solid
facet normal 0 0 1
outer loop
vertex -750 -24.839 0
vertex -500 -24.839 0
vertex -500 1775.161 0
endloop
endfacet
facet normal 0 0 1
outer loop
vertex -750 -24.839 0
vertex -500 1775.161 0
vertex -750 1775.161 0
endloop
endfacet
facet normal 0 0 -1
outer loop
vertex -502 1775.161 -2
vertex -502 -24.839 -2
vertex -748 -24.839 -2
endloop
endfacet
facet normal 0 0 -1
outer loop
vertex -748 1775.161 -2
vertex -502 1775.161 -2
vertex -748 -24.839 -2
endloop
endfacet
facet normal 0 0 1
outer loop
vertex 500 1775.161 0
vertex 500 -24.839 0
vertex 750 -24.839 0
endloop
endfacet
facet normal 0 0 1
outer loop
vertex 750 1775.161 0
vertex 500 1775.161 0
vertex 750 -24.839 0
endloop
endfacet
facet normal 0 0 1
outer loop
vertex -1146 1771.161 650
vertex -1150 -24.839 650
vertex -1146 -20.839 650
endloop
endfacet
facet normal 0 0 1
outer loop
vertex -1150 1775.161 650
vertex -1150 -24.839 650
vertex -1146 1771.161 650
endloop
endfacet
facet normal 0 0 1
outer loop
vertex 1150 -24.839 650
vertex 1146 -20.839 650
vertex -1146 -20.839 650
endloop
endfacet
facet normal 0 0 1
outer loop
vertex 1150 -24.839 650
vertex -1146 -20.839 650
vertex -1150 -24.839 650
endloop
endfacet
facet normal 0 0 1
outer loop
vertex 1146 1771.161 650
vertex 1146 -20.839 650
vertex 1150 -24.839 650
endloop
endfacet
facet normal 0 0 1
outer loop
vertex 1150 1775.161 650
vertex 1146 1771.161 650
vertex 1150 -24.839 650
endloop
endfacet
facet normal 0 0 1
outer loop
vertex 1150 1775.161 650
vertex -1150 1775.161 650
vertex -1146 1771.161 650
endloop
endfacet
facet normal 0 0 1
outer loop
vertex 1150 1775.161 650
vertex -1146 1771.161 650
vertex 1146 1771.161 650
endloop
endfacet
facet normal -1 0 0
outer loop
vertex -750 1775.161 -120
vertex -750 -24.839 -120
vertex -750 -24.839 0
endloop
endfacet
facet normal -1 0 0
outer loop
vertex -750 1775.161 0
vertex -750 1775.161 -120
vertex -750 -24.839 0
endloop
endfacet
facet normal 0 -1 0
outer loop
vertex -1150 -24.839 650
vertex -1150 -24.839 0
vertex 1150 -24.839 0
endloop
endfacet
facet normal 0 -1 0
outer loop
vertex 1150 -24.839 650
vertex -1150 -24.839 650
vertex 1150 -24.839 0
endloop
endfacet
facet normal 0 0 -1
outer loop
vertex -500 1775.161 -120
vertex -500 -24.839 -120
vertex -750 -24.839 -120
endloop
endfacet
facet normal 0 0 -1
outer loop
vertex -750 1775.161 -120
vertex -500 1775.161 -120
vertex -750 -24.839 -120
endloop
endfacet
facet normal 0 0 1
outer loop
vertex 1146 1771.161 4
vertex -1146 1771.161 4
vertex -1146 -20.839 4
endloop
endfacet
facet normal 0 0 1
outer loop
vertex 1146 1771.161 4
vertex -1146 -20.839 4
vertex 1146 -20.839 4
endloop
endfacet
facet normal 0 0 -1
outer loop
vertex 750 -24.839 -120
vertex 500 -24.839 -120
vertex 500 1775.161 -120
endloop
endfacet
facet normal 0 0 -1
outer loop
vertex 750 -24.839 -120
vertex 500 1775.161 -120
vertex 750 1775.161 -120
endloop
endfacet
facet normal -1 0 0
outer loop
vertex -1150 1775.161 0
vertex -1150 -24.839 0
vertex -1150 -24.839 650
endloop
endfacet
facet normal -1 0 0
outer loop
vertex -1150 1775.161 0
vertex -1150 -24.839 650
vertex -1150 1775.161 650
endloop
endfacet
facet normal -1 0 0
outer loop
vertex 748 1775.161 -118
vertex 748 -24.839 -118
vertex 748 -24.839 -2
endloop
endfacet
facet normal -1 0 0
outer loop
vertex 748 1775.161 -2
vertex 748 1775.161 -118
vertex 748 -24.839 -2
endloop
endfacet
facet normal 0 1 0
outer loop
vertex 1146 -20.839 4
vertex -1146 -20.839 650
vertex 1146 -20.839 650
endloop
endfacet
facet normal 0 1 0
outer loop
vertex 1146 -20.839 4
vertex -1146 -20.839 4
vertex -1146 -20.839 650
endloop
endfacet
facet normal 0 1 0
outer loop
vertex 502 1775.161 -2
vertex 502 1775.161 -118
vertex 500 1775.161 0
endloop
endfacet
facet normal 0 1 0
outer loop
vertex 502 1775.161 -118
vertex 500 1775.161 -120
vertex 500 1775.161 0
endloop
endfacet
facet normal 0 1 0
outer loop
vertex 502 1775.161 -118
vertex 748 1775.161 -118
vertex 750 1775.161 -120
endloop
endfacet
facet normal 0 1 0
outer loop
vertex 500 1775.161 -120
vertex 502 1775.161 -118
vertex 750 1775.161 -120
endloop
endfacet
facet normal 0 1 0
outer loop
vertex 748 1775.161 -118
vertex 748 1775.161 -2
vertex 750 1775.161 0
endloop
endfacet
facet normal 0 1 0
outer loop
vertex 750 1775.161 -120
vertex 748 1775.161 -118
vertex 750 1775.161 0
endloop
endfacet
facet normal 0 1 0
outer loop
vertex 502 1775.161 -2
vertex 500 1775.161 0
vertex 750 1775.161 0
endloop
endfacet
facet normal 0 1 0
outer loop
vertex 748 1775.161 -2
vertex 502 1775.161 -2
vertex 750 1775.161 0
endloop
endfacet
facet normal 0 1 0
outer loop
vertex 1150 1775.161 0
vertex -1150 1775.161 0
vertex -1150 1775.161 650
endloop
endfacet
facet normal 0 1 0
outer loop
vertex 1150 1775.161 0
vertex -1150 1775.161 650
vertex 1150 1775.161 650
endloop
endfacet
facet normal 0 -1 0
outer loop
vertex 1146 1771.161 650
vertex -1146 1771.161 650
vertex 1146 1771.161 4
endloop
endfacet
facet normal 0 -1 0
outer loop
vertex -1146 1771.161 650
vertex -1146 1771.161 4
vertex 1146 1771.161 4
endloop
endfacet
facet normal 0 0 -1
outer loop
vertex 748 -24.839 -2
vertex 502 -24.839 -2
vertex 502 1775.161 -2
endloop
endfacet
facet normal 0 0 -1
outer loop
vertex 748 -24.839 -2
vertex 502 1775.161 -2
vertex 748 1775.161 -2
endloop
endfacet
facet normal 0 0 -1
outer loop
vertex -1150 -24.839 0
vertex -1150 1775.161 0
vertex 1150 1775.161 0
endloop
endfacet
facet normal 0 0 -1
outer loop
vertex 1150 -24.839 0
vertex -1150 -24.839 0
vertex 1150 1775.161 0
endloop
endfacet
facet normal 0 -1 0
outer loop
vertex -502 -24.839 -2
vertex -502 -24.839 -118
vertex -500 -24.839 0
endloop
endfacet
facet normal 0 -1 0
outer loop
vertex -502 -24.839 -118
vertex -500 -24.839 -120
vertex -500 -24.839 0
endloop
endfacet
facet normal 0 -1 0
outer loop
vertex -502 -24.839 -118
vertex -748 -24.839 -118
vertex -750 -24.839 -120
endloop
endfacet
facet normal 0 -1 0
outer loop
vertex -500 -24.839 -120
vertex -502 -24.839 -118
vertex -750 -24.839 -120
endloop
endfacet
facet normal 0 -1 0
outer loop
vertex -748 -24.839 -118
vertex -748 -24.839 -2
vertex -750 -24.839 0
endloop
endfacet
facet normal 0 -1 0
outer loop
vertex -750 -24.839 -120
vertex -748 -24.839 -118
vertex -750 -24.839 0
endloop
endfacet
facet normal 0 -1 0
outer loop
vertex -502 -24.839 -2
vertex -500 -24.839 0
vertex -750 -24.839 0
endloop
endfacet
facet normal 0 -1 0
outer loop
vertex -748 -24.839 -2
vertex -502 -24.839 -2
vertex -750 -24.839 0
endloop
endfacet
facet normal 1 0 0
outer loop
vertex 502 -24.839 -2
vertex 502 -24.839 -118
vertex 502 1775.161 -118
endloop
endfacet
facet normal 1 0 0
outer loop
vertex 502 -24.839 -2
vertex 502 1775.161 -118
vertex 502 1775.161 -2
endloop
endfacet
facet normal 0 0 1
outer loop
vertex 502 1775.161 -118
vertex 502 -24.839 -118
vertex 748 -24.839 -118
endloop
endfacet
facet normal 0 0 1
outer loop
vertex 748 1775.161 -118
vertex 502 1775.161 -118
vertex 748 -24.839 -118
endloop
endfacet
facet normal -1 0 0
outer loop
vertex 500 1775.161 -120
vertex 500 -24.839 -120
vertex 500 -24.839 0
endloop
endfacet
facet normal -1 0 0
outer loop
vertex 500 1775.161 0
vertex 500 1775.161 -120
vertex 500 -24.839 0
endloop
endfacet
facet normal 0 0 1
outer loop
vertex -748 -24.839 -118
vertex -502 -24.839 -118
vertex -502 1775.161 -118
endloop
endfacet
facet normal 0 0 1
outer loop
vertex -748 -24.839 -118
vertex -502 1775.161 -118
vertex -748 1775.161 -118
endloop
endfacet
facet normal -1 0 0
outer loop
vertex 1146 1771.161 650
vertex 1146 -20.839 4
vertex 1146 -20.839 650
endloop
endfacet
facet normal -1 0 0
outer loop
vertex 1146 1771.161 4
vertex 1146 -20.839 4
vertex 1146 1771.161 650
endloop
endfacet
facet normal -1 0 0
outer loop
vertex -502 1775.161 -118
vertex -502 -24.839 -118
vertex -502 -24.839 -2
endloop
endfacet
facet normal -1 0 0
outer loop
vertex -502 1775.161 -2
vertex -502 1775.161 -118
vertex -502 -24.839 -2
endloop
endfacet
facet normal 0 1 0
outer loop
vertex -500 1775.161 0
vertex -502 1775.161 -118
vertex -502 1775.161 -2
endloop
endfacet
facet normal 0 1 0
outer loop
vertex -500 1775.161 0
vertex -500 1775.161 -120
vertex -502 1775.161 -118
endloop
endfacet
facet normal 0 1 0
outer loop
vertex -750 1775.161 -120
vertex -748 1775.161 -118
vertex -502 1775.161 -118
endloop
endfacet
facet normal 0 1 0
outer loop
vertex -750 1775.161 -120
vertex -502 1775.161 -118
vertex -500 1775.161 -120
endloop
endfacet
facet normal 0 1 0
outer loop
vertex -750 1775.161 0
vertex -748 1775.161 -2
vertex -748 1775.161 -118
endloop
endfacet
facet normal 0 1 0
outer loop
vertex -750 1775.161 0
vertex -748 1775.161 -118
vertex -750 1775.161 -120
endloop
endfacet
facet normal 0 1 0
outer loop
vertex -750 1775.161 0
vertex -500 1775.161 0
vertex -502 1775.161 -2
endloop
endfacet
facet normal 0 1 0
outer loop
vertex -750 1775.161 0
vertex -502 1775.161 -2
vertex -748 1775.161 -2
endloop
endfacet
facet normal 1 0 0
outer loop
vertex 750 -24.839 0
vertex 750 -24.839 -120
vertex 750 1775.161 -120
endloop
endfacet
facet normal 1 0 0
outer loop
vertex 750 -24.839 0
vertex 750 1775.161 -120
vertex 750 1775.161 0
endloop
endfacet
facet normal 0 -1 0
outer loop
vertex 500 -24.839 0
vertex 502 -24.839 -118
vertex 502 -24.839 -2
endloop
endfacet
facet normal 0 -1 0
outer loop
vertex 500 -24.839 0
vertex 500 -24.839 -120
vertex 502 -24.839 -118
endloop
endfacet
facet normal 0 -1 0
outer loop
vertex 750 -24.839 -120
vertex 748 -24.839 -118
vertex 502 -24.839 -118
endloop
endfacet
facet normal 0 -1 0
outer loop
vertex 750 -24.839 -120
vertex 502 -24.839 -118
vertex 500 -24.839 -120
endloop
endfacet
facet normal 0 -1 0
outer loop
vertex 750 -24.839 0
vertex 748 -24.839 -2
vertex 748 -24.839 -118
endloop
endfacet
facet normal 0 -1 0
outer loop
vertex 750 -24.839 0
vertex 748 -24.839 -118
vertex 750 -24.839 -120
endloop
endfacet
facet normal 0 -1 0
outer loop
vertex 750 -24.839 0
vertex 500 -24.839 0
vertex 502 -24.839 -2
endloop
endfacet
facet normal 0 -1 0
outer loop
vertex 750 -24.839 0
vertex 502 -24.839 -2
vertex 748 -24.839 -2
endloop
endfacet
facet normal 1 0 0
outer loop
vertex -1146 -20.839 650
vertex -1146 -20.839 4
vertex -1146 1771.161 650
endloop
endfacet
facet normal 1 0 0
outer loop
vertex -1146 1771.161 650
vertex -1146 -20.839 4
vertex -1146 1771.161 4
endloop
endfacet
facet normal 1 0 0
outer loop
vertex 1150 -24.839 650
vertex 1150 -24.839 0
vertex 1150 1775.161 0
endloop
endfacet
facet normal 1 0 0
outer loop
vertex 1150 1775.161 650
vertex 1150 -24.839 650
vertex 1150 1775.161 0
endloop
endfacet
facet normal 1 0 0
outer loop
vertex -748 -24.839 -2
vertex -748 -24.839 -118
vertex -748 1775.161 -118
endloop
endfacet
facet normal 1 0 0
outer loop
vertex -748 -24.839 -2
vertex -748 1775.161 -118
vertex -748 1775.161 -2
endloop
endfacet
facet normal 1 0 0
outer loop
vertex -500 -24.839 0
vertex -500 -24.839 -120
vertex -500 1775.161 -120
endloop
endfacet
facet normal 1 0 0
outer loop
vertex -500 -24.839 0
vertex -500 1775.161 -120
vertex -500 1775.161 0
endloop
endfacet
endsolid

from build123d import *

# Parameters (mm, degrees)
F0_W     = 2300
F0_H     = 1800
F1_DEPTH = 650
F2_T     = -4
F3_W     = 250
F3_H     = 120
F4_DEPTH = 1800
F5_T     = -2


with BuildPart() as f1:
    # F0 (on Top) → F1 (new body)
    with BuildSketch(Plane.XY):
        with Locations((0, 875.160629)):
            Rectangle(F0_W, F0_H)
    extrude(amount=F1_DEPTH)

    # F2
    f2_openings = [f1.faces().sort_by_distance(p)[0] for p in [
        (0, 875.160629, 650),
    ]]
    offset(amount=F2_T, openings=f2_openings)


with BuildPart() as f4:
    # F3 (on face) → F4 (new body, through all)
    with BuildSketch(Plane.XZ.offset(24.839371)):
        with Locations((625, -60)):
            Rectangle(F3_W, F3_H)
    extrude(amount=-F4_DEPTH)

    # F5
    f5_openings = [f4.faces().sort_by_distance(p)[0] for p in [
        (625, -24.839371, -60),
        (625, 1775.160629, -60),
    ]]
    offset(amount=F5_T, openings=f5_openings)


with BuildPart() as f6_1:
    # F6: instance of F4
    add(f4.part.mirror(Plane.YZ))


solid = Compound([f1.part, f4.part, f6_1.part])
